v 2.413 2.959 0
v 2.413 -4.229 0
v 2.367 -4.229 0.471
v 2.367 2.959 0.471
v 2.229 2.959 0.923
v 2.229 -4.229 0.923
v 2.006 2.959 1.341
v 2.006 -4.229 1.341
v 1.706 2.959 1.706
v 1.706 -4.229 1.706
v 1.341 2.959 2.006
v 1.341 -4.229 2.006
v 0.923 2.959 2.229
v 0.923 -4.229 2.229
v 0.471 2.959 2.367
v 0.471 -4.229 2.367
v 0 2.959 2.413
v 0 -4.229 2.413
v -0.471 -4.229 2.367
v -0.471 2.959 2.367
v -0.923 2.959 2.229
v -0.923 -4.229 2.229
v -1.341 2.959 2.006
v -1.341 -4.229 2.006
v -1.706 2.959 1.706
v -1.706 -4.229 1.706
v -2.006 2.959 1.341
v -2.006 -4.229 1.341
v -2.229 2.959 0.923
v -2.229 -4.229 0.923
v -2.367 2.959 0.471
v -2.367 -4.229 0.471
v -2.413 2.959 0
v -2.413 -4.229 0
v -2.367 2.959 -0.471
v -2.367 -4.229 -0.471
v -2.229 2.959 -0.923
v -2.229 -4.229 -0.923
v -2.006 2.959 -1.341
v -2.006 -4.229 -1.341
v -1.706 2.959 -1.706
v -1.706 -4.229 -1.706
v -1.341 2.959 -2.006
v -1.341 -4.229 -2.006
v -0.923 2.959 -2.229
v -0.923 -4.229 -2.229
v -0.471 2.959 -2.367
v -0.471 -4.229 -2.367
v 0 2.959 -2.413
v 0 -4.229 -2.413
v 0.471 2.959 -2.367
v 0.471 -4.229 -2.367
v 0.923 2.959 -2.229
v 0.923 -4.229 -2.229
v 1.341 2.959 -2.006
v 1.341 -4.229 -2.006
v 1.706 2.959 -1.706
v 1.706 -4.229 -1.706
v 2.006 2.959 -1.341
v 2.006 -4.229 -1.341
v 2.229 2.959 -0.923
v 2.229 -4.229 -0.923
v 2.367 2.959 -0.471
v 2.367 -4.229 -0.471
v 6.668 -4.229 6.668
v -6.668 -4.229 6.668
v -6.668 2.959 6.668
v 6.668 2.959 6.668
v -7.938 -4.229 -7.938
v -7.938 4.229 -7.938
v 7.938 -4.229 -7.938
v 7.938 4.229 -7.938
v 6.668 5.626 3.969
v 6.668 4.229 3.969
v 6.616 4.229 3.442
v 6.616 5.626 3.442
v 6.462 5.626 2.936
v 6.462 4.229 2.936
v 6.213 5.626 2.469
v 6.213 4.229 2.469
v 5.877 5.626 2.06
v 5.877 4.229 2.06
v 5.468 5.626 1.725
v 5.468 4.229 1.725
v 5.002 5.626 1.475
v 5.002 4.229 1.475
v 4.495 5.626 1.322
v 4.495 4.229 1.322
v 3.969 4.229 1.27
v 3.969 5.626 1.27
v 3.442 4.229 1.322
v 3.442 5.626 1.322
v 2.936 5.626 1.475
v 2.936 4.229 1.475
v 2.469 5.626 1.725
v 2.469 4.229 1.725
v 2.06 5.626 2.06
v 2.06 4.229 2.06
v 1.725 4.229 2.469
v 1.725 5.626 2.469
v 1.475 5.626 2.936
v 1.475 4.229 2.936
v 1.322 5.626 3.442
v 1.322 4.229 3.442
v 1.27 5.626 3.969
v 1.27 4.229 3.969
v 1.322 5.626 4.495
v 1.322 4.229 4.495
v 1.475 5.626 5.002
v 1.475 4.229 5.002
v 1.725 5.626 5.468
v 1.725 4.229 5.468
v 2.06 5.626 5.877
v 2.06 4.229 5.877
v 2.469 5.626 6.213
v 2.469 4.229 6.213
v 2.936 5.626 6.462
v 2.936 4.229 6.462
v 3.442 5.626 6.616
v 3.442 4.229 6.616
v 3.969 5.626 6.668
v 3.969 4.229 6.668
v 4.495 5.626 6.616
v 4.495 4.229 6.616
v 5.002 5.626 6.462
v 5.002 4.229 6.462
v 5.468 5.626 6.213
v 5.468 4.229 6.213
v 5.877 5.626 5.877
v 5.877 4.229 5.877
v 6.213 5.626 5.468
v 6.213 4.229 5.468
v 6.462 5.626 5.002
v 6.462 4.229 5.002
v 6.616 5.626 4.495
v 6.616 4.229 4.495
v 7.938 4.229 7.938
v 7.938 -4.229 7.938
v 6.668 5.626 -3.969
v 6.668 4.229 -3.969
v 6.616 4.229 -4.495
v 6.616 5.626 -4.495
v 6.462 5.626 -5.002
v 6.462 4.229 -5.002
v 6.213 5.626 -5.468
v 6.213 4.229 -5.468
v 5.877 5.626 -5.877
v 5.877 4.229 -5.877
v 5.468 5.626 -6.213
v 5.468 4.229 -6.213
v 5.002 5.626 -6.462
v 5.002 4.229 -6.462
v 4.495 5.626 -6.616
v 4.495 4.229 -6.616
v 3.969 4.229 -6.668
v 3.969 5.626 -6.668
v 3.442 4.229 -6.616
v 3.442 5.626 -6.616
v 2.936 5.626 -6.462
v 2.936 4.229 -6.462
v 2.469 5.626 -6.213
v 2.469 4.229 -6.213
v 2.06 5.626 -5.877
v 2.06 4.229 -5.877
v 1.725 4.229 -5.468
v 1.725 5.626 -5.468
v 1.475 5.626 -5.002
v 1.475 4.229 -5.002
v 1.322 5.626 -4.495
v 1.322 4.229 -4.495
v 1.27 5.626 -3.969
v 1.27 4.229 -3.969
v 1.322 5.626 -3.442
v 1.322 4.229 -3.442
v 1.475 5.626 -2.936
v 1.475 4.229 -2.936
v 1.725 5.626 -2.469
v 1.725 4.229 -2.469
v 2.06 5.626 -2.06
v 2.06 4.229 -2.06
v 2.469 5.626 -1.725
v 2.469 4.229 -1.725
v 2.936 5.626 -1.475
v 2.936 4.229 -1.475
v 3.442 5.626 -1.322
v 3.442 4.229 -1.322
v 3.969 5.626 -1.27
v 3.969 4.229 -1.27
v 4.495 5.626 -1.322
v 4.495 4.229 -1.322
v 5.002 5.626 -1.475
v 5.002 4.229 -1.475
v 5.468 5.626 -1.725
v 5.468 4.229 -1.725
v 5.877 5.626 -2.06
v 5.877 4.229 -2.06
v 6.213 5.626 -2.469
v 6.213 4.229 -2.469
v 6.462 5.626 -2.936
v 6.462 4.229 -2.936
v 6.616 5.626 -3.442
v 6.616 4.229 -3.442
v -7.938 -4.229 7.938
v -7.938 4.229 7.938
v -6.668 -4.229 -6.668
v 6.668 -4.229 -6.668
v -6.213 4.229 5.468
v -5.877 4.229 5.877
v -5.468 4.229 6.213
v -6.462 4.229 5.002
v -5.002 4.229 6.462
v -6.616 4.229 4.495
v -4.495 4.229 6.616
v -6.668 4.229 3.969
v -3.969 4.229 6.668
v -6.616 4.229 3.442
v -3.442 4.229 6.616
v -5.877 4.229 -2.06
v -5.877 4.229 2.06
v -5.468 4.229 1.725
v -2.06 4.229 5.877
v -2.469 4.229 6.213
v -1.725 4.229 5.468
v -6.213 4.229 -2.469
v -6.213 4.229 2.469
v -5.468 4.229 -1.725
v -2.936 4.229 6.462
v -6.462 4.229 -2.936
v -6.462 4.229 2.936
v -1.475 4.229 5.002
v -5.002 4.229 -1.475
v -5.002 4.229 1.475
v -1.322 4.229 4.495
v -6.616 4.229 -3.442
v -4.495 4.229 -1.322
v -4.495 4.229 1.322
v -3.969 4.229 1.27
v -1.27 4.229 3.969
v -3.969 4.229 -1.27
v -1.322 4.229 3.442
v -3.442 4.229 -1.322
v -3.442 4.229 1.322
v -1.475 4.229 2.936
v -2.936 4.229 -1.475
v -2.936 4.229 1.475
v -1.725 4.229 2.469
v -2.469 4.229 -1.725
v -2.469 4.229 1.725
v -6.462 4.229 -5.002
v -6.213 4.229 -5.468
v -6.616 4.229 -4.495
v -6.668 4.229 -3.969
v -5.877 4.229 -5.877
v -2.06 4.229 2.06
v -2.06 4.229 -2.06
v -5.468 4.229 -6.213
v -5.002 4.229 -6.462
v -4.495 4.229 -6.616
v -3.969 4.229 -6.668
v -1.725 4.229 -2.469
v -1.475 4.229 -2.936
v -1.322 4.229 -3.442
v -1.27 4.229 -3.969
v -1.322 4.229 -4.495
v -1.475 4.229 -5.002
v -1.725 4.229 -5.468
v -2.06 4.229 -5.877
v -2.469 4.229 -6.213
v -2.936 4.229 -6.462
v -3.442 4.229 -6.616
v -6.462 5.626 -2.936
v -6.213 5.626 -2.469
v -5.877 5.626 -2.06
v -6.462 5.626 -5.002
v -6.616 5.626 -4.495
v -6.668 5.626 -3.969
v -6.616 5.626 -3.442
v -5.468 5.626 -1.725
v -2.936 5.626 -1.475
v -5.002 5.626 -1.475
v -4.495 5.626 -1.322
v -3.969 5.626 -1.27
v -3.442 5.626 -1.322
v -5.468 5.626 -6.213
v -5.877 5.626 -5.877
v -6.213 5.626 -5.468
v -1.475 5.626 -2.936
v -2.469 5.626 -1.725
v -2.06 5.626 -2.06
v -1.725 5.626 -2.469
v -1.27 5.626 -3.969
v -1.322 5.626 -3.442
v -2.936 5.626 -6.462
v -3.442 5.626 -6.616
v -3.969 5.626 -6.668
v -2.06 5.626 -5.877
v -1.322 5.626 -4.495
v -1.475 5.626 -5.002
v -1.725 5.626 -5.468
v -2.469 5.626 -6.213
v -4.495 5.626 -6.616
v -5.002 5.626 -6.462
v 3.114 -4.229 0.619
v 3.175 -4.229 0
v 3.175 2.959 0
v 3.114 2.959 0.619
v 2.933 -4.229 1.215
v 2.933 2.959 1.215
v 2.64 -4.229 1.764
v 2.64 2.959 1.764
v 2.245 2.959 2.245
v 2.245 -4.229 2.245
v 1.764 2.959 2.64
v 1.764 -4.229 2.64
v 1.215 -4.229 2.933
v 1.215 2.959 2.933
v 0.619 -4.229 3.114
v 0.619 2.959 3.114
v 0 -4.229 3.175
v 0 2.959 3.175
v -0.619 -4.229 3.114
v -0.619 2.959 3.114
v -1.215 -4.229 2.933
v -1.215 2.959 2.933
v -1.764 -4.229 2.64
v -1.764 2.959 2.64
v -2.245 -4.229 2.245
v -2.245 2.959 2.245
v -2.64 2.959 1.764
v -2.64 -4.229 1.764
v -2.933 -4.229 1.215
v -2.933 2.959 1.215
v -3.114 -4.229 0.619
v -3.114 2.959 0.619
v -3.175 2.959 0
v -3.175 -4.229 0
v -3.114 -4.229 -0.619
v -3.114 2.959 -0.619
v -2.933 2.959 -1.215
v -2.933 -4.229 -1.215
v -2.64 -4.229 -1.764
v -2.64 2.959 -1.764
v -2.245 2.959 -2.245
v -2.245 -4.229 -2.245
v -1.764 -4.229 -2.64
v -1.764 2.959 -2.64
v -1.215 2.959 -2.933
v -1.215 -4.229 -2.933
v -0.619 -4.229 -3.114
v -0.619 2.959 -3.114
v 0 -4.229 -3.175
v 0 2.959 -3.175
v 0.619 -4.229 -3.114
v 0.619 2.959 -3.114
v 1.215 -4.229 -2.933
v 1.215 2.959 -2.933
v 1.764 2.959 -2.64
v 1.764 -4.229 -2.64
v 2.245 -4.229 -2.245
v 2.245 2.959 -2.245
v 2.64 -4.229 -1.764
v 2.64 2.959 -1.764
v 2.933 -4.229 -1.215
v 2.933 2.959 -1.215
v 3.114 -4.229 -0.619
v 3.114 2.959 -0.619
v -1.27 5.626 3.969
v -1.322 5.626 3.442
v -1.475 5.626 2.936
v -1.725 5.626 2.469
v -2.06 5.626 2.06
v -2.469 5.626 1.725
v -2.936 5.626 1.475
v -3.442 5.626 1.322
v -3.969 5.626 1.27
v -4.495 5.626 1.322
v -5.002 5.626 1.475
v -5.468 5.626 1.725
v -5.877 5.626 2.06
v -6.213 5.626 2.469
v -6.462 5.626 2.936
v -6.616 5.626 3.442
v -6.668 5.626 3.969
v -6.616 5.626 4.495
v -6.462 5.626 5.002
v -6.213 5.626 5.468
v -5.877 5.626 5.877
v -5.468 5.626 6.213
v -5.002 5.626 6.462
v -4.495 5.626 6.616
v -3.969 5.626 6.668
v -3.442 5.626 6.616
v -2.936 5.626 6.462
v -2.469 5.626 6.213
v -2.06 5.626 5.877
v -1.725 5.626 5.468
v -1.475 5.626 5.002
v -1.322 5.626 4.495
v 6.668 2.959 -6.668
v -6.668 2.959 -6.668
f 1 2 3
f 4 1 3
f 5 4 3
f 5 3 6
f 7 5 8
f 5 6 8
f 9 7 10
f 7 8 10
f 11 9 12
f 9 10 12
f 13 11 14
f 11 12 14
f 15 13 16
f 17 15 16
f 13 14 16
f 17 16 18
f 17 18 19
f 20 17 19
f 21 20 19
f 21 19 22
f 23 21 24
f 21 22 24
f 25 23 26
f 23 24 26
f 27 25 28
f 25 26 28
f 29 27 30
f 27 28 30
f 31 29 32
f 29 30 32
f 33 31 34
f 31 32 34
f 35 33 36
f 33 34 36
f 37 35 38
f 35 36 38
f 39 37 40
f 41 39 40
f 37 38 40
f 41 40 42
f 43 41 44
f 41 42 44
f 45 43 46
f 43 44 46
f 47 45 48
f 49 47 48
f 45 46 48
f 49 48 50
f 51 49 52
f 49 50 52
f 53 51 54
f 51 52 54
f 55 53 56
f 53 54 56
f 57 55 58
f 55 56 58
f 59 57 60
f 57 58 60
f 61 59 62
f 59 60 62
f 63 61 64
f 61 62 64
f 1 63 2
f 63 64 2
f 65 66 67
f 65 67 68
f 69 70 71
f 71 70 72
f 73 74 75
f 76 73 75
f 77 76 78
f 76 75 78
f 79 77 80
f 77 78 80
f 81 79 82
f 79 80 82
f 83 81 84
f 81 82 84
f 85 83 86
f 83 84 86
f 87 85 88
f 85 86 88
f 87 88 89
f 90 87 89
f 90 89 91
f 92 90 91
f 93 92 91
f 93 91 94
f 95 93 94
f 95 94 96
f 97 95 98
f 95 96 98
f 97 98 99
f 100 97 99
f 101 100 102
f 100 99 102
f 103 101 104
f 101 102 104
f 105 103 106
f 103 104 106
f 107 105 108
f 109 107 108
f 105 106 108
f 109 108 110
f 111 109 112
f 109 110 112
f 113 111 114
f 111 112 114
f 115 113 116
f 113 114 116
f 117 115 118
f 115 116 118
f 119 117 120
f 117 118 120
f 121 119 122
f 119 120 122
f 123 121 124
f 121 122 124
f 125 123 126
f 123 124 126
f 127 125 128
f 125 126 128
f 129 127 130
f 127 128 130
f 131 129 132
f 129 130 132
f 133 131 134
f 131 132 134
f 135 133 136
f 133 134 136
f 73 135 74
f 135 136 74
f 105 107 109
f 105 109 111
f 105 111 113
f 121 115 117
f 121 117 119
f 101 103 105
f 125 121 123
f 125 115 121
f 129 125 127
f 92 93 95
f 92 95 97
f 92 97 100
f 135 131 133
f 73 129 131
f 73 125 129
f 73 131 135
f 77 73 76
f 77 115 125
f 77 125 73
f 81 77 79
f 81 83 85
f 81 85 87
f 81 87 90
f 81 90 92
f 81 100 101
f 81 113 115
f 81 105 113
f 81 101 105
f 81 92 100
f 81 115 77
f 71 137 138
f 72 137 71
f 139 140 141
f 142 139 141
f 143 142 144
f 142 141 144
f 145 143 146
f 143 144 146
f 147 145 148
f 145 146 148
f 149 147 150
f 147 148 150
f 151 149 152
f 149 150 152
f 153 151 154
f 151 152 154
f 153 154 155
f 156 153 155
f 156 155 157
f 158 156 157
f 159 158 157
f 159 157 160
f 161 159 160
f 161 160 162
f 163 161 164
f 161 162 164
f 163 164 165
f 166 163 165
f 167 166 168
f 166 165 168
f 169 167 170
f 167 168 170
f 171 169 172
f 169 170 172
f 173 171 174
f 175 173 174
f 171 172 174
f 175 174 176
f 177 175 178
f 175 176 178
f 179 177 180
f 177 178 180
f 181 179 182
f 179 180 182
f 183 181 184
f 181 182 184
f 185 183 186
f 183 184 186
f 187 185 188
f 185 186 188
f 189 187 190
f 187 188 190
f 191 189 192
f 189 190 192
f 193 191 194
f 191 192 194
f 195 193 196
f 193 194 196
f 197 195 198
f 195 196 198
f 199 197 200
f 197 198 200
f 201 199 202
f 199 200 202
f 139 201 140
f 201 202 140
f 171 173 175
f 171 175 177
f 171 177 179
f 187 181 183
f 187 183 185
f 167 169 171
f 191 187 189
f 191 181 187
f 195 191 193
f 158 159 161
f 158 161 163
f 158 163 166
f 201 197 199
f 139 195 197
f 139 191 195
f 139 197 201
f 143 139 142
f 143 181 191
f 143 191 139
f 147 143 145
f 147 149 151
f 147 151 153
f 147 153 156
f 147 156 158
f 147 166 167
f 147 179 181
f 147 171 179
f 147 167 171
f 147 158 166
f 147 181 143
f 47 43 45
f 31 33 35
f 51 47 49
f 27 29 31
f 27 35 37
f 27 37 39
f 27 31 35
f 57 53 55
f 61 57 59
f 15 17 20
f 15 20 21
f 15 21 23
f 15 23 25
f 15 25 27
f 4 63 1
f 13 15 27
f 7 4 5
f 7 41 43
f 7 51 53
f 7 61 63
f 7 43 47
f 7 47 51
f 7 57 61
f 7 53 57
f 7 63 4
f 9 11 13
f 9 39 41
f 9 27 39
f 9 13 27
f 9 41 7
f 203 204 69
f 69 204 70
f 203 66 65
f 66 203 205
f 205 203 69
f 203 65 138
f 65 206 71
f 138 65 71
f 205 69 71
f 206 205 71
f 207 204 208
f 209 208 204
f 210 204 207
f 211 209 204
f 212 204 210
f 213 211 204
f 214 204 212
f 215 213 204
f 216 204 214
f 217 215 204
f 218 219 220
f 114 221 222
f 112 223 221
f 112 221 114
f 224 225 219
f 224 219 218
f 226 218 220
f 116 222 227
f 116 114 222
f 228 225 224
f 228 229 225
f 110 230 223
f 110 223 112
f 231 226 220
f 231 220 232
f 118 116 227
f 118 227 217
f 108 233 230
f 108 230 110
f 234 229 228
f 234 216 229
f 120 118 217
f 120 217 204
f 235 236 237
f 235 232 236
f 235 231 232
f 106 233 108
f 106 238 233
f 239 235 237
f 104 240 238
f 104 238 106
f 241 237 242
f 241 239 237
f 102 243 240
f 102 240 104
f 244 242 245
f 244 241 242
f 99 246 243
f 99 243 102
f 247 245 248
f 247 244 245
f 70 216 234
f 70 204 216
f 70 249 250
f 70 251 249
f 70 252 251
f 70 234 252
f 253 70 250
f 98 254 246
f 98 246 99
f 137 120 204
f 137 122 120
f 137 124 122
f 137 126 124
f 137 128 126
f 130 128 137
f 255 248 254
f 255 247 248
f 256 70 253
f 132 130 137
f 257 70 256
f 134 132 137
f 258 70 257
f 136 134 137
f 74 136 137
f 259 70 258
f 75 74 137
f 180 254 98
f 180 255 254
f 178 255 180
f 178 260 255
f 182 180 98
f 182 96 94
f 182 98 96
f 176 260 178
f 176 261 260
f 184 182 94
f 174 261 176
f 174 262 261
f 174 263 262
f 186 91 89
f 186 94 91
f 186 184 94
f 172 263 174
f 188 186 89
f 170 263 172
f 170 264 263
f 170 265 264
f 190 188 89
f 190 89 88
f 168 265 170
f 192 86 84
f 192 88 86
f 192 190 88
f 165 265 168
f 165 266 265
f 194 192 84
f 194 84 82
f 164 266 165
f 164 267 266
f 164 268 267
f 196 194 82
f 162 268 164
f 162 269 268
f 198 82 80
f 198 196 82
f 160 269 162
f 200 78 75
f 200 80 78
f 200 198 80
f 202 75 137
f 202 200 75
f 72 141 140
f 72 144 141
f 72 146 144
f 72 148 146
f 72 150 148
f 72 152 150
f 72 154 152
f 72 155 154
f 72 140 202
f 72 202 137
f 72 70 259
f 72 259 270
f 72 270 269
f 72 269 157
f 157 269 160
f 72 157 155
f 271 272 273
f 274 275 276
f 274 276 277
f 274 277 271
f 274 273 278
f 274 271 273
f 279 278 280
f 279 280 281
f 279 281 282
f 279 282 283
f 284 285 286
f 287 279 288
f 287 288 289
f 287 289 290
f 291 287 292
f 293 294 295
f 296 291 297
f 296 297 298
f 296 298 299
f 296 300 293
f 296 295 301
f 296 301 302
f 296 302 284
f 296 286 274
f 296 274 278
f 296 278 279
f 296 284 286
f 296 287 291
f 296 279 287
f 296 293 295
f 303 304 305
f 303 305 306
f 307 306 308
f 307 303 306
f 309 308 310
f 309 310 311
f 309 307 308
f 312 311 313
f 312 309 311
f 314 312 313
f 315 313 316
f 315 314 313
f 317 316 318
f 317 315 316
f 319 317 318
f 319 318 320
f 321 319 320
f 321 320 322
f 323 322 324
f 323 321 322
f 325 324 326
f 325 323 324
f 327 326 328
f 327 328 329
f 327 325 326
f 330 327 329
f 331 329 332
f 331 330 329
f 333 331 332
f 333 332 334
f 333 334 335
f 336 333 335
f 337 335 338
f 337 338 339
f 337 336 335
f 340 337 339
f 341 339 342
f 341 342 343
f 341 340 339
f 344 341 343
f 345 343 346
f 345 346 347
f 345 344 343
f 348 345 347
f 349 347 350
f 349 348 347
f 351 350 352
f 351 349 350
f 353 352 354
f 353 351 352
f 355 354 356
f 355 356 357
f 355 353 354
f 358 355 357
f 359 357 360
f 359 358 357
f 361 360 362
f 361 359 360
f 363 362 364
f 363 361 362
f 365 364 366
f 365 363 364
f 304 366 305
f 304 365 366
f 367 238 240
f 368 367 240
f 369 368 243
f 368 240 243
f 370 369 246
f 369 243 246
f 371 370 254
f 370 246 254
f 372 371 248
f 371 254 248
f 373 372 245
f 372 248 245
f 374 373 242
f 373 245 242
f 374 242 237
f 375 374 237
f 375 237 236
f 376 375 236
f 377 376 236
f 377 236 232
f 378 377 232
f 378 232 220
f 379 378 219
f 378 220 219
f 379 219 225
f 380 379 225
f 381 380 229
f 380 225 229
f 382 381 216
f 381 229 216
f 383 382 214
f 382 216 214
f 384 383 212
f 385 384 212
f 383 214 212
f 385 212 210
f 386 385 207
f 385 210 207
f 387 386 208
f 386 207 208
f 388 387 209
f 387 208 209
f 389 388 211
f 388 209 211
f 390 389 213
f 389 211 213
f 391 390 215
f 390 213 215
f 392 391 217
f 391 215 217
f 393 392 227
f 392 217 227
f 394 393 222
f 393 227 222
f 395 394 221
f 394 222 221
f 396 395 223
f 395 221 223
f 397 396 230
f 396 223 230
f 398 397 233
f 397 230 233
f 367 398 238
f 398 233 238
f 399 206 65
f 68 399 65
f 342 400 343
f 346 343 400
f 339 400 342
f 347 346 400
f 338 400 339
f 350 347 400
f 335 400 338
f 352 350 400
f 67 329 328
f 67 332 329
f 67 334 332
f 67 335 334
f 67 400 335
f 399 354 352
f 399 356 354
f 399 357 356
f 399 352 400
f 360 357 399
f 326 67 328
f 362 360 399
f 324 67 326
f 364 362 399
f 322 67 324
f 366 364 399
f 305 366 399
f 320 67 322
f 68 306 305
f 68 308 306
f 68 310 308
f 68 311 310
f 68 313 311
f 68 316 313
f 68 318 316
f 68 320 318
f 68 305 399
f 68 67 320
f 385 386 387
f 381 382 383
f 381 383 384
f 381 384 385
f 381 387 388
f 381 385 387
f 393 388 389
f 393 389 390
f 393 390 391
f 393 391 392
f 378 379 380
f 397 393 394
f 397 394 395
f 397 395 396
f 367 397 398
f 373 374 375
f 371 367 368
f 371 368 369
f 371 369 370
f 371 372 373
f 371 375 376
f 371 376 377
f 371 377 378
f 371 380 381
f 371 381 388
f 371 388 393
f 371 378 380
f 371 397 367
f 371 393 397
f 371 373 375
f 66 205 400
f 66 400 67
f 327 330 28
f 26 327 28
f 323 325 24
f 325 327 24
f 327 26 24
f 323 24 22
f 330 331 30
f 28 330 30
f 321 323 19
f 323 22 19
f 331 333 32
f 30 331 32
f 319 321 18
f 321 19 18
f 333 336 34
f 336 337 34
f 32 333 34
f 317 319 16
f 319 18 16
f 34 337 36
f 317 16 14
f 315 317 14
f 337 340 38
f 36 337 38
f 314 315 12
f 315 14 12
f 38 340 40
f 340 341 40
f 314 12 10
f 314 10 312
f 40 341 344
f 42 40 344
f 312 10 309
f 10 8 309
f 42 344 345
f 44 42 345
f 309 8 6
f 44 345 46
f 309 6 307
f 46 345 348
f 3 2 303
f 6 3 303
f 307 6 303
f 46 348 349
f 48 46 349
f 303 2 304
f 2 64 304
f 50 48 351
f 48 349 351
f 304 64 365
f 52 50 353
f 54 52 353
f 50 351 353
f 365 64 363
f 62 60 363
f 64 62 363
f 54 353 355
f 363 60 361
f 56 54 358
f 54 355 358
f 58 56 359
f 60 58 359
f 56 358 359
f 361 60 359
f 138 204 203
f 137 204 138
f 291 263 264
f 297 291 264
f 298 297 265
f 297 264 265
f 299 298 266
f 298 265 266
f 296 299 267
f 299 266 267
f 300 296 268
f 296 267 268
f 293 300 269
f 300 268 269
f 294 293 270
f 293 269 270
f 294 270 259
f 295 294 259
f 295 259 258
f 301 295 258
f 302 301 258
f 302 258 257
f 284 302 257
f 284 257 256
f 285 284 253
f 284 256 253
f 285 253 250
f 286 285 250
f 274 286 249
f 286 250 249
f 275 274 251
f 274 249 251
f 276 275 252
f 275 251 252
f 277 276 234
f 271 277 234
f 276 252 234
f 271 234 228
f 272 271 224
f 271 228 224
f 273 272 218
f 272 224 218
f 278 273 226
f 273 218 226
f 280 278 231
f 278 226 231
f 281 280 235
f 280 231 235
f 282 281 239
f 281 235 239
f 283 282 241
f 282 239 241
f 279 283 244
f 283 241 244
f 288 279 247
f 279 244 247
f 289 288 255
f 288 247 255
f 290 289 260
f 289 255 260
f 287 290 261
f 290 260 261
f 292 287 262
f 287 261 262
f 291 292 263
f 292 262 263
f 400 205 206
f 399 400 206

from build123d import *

# Parameters (mm, degrees)
SKETCH1_W           = 15.875
SKETCH1_H           = 15.875
BOSS_EXTRUDE1_DEPTH = 4.2291
SKETCH2_W           = 13.335
SKETCH2_H           = 13.335
SKETCH2_R           = 3.175
SKETCH2_R_2         = 2.413
CUT_EXTRUDE1_DEPTH  = 7.1882
SKETCH3_R           = 2.69875
BOSS_EXTRUDE2_DEPTH = 1.397


with BuildPart() as part:
    # Sketch1 → Boss-Extrude1 (new body, symmetric)
    with BuildSketch(Plane(origin=(0, 0, 0), x_dir=(1, 0, 0), z_dir=(0, 1, 0))):
        Rectangle(SKETCH1_W, SKETCH1_H)
    extrude(amount=BOSS_EXTRUDE1_DEPTH, both=True)

    # Sketch2 → Cut-Extrude1 (cut)
    with BuildSketch(Plane.XZ.offset(4.2291)):
        Rectangle(SKETCH2_W, SKETCH2_H)
        Circle(SKETCH2_R, mode=Mode.SUBTRACT)
        Circle(SKETCH2_R_2)
    extrude(amount=-CUT_EXTRUDE1_DEPTH, mode=Mode.SUBTRACT)

    # Sketch3 → Boss-Extrude2 (add)
    with BuildSketch(Plane(origin=(0, 4.2291, 0), x_dir=(1, 0, 0), z_dir=(0, 1, 0))):
        with Locations((3.96875, -3.96875)):
            Circle(SKETCH3_R)
        with Locations((3.96875, 3.96875)):
            Circle(SKETCH3_R)
        with Locations((-3.96875, -3.96875)):
            Circle(SKETCH3_R)
        with Locations((-3.96875, 3.96875)):
            Circle(SKETCH3_R)
    extrude(amount=BOSS_EXTRUDE2_DEPTH)


solid = part.part
